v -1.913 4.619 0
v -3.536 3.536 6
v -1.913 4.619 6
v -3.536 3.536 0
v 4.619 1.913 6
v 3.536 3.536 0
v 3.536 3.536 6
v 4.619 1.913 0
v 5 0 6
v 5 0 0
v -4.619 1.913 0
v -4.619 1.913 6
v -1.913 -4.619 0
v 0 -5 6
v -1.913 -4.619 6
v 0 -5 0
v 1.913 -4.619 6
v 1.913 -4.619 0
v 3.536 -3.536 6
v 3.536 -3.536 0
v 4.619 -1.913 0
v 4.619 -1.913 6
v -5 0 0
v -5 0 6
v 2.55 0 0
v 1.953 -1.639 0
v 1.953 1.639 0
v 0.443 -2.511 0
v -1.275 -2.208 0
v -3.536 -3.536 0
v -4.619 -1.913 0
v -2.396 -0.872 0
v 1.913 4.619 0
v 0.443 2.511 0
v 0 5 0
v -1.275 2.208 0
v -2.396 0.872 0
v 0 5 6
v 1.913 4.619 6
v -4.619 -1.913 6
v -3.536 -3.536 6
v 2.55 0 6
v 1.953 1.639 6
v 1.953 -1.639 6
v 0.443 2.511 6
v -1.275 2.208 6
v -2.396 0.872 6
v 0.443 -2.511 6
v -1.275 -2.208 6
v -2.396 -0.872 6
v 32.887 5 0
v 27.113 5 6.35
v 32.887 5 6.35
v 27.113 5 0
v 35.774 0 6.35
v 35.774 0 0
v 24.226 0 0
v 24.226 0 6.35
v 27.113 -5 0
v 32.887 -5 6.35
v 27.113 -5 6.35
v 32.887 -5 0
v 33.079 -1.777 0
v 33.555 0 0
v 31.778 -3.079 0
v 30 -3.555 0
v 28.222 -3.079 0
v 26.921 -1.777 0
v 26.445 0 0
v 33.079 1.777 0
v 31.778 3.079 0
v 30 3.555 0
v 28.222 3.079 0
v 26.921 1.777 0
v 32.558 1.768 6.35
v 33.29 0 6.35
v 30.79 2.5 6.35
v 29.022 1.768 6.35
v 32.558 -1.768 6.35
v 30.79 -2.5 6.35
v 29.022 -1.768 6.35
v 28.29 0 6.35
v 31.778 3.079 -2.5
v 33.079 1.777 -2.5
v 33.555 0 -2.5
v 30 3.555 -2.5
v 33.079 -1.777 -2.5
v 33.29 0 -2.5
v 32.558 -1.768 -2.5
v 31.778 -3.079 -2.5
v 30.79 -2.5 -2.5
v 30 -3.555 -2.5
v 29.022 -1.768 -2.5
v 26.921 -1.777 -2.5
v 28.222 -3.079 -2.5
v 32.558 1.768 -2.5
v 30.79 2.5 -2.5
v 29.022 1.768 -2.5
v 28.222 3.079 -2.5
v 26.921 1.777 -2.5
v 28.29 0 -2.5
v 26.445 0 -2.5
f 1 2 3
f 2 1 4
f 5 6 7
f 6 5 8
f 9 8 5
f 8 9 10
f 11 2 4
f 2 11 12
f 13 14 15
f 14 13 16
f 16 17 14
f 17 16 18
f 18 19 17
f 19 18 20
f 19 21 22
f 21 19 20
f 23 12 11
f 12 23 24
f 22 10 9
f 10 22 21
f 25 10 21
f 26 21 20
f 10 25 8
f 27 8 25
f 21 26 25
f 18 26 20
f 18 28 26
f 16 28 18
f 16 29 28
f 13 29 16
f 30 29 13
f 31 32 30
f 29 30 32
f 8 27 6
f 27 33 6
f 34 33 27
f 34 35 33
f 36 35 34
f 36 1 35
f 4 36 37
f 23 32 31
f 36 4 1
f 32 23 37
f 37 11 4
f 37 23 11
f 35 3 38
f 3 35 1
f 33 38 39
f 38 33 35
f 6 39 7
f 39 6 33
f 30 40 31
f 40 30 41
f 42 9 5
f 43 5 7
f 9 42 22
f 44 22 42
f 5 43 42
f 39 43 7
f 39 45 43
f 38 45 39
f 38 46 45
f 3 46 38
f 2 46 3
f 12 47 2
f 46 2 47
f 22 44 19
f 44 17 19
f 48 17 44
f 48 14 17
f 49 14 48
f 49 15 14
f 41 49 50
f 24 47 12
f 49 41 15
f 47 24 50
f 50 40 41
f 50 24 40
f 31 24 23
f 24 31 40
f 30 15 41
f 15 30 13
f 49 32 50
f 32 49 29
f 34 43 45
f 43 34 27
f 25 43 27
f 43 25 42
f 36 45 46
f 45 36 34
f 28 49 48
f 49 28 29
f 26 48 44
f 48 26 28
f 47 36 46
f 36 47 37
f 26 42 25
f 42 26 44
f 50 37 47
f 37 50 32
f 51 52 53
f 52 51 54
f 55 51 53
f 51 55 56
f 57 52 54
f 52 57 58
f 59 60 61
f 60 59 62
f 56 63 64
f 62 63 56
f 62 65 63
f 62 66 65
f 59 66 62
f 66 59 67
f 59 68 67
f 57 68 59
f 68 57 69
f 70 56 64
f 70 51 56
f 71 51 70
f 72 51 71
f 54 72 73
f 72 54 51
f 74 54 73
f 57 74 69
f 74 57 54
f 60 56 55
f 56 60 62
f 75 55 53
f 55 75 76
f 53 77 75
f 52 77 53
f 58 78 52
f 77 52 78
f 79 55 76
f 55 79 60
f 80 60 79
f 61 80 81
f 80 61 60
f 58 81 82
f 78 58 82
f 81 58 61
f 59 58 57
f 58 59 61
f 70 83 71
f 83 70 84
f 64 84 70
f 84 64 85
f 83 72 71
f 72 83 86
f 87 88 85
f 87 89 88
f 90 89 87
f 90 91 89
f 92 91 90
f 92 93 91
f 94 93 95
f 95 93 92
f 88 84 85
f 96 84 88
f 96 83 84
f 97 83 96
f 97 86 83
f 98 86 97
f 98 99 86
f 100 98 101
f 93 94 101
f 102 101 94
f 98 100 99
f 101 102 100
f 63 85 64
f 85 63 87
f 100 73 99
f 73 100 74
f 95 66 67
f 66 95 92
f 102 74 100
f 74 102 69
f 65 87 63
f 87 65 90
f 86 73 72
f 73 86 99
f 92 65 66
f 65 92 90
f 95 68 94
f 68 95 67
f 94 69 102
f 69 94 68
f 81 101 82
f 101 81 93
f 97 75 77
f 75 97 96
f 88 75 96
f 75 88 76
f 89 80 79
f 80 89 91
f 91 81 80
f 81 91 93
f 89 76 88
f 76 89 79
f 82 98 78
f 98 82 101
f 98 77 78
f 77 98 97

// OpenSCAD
// file: geom.scad
module rotate_at(angle, pivot) {
  translate(pivot)
    rotate(angle)
      translate(-pivot)
        children();
}

module rotate_z_at(angle, pivot) {
  translate([pivot[0], pivot[1], 0])
    rotate([0, 0, angle])
      translate([-pivot[0], -pivot[1], 0])
        children();
}

module rotate_y_at(angle, pivot) {
  translate([pivot[0], 0, pivot[1]])
    rotate([0, angle, 0])
      translate([-pivot[0], 0, -pivot[1]])
        children();
}

module rotate_x_at(angle, pivot) {
  translate([0, pivot[0], pivot[1]])
    rotate([angle, 0, 0])
      translate([0, -pivot[0], -pivot[1]])
        children();
}


module hexagon(r = 1, h = 1) {
  points = [
    [cos(  0), sin(  0)] * r,
    [cos( 60), sin( 60)] * r,
    [cos(120), sin(120)] * r,
    [cos(180), sin(180)] * r,
    [cos(240), sin(240)] * r,
    [cos(300), sin(300)] * r
  ];
  translate([0, 0, -h/2])
    linear_extrude(h)
      polygon(points);
}
// file: bom.scad
module bom(code, desc, category) {
	echo(str(
    "BOM: { \"code\" : \"",
    code,
    "\", \"description\" : \"",
    desc,
    "\", \"categories\" : ",
    category,
    " }"
  ));
}
// main file
include <MCAD/materials.scad>
use <bom.scad>;
use <geom.scad>;

module ob_spacer(length = 1) {
  bom(str("ob-alu-spacer-",length), str("Aluminum Spacer (", length,")"), ["hardware"]);
  color(Aluminum)
    difference() {
      cylinder(length, 5, 5);
      translate([0, 0, -length/2])
        cylinder(length*2, 2.55, 2.55);
    }
}

module ob_eccentric_spacer() {
  bom("ob-eccentric-spacer", "Eccentric Spacer", ["hardware"]);
  length = 6.35;
  length2 = 2.5;
  lengtht = length + length2;
  m5 = 5;
  diam = 7.11;
  center_offset = 0.79;
  color(Steel)
  difference() {
    union() {
      translate([0,0,length/2])
        scale([1,1,length])
          hexagon(5.774);
      translate([0,0,-length2])
        cylinder(length2,diam/2,diam/2);
    }
    translate([center_offset,0,-lengtht])
      cylinder(lengtht*2,m5/2,m5/2);
  }
}

module ob_spacer_test() {
  ob_spacer(6);
  translate([30, 0, 0])
    ob_eccentric_spacer();
}

ob_spacer_test();
